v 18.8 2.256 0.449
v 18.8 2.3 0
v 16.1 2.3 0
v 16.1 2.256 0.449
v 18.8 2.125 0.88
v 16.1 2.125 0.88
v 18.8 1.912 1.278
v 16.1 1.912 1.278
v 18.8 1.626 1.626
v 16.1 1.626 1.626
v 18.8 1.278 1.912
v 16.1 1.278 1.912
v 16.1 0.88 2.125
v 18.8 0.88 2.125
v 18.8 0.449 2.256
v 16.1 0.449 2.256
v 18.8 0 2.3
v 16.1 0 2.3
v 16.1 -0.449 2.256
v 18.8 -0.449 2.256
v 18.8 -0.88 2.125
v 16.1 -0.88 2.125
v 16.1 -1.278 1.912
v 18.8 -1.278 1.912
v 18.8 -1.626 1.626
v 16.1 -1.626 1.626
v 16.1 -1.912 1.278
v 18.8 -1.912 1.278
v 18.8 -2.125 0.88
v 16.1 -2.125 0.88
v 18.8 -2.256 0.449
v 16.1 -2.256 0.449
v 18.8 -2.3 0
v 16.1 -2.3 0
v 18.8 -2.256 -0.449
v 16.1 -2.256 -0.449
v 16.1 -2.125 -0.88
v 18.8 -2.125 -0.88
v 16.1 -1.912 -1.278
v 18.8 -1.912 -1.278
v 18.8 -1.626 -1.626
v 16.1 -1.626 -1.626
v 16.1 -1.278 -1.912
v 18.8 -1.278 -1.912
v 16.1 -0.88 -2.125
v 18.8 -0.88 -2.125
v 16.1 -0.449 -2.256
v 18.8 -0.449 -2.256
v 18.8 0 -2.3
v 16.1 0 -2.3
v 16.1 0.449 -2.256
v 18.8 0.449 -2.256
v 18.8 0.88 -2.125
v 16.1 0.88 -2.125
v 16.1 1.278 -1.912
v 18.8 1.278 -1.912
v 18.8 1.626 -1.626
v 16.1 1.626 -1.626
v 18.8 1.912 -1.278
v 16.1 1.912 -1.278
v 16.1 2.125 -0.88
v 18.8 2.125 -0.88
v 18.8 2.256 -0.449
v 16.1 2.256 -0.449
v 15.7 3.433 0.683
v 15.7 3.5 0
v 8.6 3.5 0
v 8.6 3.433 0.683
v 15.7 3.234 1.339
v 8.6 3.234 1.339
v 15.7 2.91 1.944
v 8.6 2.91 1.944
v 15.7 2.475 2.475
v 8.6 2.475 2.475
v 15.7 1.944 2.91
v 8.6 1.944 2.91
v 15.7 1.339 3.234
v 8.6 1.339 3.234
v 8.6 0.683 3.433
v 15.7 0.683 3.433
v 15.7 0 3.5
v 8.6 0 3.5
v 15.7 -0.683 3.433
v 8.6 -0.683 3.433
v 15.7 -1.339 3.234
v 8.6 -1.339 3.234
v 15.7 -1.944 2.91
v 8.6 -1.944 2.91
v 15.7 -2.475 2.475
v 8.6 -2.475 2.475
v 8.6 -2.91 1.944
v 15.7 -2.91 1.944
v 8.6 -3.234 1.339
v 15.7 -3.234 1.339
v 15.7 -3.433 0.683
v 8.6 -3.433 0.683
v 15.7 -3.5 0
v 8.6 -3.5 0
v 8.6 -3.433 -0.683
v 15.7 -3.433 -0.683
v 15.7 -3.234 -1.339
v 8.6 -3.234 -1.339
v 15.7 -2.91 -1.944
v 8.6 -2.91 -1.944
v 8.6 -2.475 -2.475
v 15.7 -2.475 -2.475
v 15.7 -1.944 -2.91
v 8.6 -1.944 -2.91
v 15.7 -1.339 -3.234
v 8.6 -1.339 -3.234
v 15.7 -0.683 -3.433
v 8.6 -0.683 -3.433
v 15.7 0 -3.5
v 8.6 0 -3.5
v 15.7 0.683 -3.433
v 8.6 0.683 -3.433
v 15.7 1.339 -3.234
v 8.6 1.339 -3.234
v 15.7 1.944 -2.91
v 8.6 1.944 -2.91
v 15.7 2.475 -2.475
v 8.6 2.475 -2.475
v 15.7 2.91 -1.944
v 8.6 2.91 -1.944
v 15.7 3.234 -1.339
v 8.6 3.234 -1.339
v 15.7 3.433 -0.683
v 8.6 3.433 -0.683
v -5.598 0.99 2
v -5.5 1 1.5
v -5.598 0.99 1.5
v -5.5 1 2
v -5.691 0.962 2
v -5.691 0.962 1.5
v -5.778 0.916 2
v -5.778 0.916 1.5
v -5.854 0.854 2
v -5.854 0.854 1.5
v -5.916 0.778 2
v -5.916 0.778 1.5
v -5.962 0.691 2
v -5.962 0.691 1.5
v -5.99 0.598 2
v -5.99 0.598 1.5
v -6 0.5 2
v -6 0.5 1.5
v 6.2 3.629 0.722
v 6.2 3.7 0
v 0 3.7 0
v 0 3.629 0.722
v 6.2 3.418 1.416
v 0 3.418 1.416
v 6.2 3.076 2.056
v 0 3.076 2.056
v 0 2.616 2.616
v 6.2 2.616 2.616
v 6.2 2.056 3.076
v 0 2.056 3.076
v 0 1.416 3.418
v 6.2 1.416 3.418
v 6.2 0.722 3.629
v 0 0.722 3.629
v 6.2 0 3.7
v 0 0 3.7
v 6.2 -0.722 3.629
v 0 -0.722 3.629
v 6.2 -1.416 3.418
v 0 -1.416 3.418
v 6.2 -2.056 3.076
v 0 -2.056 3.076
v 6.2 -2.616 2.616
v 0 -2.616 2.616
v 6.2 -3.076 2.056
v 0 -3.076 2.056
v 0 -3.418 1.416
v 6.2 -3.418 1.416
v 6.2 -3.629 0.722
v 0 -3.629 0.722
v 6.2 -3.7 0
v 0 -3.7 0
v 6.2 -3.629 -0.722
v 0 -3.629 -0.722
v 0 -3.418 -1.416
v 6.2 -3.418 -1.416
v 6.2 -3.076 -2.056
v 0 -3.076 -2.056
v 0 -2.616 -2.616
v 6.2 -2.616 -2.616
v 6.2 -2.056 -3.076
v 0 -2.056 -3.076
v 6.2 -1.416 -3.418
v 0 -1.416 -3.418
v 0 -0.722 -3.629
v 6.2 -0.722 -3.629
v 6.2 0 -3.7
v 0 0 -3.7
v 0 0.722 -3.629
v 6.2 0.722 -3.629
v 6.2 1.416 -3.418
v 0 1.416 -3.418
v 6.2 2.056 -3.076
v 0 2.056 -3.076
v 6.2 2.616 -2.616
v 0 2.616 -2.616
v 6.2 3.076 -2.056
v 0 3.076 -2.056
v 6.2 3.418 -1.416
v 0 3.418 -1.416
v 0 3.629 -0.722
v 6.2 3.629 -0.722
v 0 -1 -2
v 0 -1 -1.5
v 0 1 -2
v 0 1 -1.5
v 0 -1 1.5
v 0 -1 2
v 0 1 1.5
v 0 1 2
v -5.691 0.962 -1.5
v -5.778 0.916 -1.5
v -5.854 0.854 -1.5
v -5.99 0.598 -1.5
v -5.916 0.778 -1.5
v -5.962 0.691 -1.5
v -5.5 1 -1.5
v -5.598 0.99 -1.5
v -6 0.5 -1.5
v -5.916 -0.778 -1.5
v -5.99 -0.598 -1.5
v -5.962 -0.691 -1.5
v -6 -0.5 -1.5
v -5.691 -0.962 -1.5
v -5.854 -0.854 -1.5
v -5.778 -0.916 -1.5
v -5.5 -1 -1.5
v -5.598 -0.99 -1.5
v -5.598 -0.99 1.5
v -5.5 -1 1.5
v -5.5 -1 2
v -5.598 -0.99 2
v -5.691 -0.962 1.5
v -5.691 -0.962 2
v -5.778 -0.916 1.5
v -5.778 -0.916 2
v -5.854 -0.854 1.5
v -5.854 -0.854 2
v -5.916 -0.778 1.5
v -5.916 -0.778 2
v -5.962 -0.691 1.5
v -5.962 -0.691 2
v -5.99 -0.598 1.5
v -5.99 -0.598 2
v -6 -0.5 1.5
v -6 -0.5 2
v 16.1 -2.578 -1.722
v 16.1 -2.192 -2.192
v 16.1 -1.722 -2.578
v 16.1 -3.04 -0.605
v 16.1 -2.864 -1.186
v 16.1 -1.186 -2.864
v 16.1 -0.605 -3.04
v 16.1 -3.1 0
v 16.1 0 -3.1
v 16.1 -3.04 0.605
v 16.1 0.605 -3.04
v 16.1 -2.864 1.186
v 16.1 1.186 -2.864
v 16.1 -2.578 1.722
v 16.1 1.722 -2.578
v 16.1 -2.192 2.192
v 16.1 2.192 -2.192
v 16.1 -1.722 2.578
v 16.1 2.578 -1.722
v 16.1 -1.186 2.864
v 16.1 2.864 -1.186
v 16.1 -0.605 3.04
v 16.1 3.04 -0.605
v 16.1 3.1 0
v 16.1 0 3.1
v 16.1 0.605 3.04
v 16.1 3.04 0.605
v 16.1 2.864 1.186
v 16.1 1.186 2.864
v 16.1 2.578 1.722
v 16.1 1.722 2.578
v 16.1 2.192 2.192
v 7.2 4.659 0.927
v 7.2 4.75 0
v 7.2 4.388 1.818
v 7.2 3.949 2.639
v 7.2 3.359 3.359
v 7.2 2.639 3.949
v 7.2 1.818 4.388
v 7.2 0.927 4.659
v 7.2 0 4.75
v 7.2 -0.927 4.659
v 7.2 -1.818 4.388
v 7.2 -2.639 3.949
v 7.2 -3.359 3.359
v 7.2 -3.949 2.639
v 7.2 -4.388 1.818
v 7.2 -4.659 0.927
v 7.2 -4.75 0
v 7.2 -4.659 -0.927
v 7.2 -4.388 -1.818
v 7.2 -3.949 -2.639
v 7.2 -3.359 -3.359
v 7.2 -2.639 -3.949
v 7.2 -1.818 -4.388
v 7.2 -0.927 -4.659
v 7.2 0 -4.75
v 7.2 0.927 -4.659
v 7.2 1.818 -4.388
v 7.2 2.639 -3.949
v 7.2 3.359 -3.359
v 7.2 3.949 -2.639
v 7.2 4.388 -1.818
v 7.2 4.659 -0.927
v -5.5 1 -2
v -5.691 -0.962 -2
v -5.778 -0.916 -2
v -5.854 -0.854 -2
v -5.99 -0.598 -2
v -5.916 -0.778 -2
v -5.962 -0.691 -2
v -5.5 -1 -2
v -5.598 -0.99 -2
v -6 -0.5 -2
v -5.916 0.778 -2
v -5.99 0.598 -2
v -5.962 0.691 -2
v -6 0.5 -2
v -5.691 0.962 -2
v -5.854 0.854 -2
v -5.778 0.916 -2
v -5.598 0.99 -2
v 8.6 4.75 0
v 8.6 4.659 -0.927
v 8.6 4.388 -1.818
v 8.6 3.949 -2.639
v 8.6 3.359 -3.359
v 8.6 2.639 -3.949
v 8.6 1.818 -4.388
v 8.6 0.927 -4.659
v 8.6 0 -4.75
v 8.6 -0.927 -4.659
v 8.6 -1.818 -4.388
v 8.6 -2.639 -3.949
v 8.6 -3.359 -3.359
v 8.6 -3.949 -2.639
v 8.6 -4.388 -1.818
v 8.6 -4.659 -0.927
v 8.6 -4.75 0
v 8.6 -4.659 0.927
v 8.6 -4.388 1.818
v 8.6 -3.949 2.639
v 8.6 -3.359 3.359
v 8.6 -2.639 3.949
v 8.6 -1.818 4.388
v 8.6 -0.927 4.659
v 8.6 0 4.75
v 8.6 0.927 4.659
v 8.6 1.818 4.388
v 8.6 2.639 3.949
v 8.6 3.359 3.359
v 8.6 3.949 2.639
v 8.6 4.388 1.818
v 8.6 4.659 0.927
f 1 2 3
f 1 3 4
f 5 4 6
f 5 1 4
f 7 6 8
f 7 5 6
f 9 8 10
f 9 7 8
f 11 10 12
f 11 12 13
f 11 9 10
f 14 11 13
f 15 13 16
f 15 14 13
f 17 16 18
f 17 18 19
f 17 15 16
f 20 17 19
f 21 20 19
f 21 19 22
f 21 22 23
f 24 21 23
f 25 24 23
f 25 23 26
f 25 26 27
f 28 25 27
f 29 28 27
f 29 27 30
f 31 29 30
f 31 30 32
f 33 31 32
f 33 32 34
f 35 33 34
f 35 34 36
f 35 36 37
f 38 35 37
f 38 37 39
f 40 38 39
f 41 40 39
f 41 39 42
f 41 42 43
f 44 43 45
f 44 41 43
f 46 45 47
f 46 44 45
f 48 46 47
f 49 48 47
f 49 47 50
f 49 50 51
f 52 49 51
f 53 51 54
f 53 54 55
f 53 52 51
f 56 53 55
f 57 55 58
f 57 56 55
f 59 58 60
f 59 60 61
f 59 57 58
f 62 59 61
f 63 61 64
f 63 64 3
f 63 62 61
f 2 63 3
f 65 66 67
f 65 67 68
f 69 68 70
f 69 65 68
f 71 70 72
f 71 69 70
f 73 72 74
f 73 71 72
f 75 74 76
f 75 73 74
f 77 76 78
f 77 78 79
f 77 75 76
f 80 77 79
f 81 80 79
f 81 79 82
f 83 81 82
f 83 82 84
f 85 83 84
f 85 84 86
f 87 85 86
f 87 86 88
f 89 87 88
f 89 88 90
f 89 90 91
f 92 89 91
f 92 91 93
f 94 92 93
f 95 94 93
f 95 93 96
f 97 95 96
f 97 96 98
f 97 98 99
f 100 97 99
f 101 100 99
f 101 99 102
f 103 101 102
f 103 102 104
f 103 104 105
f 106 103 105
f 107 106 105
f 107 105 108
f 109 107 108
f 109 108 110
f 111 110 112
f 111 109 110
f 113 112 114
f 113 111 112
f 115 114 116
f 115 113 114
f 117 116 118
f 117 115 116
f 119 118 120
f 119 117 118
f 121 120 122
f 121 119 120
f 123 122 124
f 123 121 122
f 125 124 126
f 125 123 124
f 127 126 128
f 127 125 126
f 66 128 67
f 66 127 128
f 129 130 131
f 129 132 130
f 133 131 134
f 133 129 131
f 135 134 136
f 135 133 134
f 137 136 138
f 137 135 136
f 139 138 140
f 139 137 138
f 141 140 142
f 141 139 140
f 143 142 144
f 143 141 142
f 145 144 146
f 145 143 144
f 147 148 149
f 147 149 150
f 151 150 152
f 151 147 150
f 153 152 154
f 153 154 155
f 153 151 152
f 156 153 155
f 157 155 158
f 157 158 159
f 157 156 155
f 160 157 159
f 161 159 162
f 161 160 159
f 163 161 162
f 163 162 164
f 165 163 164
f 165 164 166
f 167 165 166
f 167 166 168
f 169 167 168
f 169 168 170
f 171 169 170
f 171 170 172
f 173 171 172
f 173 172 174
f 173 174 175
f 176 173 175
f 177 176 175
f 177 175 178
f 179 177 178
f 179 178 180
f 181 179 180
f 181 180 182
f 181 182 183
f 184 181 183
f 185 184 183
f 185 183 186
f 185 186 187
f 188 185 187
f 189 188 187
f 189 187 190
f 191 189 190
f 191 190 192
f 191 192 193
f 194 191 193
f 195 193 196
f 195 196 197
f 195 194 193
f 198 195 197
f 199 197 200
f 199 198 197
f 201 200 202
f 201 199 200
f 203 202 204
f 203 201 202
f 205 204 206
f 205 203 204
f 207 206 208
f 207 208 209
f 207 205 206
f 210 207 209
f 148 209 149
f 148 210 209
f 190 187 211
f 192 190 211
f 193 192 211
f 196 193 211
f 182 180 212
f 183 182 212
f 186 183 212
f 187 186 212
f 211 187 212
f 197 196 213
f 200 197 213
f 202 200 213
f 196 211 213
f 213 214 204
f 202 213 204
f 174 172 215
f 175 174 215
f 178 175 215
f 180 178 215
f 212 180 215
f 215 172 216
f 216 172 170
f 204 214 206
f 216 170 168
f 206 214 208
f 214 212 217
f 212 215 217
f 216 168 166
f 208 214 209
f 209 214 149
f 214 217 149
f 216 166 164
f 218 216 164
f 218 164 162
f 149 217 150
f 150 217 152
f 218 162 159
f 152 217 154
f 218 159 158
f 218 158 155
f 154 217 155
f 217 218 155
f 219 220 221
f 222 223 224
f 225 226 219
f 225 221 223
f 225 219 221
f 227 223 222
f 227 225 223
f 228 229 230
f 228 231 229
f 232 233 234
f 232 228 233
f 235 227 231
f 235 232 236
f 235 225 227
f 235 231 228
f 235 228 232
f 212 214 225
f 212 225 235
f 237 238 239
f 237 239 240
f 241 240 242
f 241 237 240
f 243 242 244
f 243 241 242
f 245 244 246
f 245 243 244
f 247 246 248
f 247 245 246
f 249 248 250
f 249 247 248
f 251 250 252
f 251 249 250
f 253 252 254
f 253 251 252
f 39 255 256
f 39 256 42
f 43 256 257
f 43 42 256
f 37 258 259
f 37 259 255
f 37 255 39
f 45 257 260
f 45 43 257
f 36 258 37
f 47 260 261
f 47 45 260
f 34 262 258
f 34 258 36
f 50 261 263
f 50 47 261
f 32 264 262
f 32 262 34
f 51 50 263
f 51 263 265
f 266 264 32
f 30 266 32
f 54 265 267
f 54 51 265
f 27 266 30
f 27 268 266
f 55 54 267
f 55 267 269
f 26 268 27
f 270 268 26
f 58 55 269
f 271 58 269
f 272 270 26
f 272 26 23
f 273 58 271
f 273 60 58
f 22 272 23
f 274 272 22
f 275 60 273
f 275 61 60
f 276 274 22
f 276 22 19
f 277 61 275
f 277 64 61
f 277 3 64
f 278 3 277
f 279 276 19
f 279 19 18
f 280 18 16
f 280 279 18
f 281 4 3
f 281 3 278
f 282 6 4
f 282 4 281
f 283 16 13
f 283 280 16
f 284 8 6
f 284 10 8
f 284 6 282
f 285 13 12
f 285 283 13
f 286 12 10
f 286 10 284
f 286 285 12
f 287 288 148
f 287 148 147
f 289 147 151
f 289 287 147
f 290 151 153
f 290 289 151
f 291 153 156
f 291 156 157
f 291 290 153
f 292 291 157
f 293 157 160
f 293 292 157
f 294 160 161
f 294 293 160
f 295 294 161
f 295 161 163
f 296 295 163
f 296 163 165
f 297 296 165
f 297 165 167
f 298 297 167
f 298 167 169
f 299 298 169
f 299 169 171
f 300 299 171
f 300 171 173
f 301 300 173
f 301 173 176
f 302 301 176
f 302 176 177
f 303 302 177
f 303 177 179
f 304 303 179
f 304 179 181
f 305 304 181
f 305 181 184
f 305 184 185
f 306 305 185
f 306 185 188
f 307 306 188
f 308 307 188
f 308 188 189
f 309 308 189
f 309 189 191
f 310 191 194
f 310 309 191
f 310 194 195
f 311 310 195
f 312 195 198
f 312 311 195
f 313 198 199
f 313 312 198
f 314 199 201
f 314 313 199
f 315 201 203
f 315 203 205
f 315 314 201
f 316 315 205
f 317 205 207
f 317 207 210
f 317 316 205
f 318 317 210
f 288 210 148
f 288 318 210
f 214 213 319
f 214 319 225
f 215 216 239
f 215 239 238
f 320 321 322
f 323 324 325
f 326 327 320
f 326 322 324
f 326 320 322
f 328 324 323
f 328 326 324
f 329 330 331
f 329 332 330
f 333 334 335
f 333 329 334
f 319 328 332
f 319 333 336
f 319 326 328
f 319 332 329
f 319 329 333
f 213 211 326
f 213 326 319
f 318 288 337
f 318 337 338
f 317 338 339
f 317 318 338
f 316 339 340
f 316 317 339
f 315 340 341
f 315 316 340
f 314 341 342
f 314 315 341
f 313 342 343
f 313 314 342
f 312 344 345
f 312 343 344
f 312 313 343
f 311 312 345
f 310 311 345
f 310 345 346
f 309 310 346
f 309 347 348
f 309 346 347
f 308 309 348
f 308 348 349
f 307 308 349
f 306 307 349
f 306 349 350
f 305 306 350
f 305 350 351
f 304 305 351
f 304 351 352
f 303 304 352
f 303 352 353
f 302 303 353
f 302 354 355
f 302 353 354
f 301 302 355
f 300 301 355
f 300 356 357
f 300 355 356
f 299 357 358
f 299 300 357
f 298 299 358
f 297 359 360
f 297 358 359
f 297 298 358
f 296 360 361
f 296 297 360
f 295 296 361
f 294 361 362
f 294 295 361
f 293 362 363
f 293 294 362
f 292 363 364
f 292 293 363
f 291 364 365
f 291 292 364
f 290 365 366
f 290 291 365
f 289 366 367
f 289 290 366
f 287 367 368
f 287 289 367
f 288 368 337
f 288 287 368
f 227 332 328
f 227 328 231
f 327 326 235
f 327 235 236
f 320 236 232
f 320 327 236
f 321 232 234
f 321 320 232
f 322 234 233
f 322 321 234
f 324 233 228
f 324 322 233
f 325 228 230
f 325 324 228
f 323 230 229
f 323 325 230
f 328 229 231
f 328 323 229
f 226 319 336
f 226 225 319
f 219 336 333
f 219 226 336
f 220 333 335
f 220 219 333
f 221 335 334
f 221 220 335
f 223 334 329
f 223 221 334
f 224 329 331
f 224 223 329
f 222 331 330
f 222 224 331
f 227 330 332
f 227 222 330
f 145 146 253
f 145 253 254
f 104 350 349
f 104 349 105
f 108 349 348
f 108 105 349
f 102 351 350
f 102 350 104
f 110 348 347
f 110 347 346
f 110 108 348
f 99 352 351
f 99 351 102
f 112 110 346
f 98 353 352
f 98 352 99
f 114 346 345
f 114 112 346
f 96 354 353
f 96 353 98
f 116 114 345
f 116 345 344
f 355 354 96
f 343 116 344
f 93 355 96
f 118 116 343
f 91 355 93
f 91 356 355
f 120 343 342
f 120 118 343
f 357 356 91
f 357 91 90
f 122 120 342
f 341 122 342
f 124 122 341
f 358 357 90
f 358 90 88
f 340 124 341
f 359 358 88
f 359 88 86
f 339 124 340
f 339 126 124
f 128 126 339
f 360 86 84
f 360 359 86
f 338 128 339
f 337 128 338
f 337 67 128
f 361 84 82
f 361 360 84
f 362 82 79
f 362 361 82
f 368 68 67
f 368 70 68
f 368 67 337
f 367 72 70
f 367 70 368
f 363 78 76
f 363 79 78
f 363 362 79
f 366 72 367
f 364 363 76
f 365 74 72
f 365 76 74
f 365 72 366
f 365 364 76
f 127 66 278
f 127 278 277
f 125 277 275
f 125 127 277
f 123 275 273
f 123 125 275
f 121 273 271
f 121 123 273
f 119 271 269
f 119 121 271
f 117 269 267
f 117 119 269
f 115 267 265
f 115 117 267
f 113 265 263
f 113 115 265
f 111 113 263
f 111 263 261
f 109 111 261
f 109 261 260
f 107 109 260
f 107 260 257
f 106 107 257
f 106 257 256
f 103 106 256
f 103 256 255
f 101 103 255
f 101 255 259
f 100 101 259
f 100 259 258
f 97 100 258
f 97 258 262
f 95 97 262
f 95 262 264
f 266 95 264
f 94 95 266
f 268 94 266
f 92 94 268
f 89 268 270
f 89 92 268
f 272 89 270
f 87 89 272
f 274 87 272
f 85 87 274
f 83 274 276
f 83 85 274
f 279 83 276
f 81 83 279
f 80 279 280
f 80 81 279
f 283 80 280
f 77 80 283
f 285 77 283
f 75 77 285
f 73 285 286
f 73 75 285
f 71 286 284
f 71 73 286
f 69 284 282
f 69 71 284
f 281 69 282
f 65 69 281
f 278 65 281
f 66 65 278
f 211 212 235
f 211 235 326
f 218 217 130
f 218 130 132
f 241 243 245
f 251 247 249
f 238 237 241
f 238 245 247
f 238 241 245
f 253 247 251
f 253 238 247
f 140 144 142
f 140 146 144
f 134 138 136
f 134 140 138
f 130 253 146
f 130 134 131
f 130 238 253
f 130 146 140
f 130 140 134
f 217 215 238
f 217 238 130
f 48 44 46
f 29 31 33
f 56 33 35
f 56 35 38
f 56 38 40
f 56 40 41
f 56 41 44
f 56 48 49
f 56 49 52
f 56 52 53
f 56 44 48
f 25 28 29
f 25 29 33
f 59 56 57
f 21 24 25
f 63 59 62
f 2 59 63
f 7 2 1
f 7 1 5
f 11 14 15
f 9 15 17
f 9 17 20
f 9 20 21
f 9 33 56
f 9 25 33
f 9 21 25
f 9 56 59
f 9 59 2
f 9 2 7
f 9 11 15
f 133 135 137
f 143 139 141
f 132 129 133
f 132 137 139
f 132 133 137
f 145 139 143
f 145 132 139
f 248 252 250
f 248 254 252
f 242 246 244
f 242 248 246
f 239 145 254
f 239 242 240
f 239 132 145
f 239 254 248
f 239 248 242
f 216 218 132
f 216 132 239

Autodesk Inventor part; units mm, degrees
ref_plane "YZ Plane" through (0, 0, 0) normal (1, 0, 0) x (0, 1, 0)
ref_plane "XZ Plane" through (0, 0, 0) normal (0, 1, 0) x (-1, 0, 0)
ref_plane "XY Plane" through (0, 0, 0) normal (0, 0, 1) x (1, 0, 0)
sketch "Esquisse1" plane through (0, 0, 0) normal (0, 0, 1) x (1, 0, 0)
  line L0 (-14.8768, 0) -> (-3.0909, 0)
  line L1 (0, 3.7) -> (0, 0)
  line L2 (8.6, 4.75) -> (7.2, 4.75)
  line L3 (8.6, 3.5) -> (8.6, 4.75)
  line L4 (8.6, 3.5) -> (16.1, 3.5)
  line L5 (16.1, 3.5) -> (16.1, 2.3)
  line L6 (16.1, 2.3) -> (18.8, 2.3)
  line L7 (18.8, 2.3) -> (18.8, 3)
  line L8 (0, 3.7) -> (6.2, 3.7)
  line L9 (6.2, 3.7) -> (7.2, 4.75)
  line L10 (18.8, 2.3) -> (18.8, 0)
  line L11 (18.8, 0) -> (0, 0)
  dimension "d4" = 9.5
  dimension "d5" = 7
  dimension "d6" = 4.6
  dimension "d9" = 1.4
  dimension "d10" = 7.4
  dimension "d11" = 1
  dimension "d12" = 7.5
  dimension "d15" = 2.7
  dimension "d16" = 18.8
revolve "Révolution1" add sketch "Esquisse1" angle 360 about axis through (-14.8768, 0, 0) along (1, 0, 0)
thread "Filetage1" size "M7x0.75" class "6g" standard "ANSI Metric M Profile" length 6.3
chamfer "Chanfrein1" distance 0.4 angle 45 1 edges at (16.1, -3.5, 0)
sketch "Esquisse2" plane through (0, 0, 0) normal (-1, 0, 0) x (0, 0, 1)
  line L0 (2, -1) -> (1.5, -1)
  line L1 (1.5, -1) -> (1.5, 1)
  line L2 (1.5, 1) -> (2, 1)
  line L3 (2, 1) -> (2, -1)
  line L4 (-1.5, -1) -> (-2, -1)
  line L5 (-2, -1) -> (-2, 1)
  line L6 (-2, 1) -> (-1.5, 1)
  line L7 (-1.5, 1) -> (-1.5, -1)
  line L8 (0, -6.65) -> (0, 6.65) construction
  line L9 (-6.65, 0) -> (6.65, 0) construction
  point P0 (0, 0)
  dimension "d23" = 0.5
  dimension "d24" = 2
  dimension "d25" = 3
extrude "Extrusion1" add sketch "Esquisse2" along normal blind 6
fillet "Congé1" radius 0.5 4 edges at (-6, -1, 1.75) (-6, 1, 1.75) (-6, 1, -1.75) (-6, -1, -1.75)
properties part number "Bouton"
